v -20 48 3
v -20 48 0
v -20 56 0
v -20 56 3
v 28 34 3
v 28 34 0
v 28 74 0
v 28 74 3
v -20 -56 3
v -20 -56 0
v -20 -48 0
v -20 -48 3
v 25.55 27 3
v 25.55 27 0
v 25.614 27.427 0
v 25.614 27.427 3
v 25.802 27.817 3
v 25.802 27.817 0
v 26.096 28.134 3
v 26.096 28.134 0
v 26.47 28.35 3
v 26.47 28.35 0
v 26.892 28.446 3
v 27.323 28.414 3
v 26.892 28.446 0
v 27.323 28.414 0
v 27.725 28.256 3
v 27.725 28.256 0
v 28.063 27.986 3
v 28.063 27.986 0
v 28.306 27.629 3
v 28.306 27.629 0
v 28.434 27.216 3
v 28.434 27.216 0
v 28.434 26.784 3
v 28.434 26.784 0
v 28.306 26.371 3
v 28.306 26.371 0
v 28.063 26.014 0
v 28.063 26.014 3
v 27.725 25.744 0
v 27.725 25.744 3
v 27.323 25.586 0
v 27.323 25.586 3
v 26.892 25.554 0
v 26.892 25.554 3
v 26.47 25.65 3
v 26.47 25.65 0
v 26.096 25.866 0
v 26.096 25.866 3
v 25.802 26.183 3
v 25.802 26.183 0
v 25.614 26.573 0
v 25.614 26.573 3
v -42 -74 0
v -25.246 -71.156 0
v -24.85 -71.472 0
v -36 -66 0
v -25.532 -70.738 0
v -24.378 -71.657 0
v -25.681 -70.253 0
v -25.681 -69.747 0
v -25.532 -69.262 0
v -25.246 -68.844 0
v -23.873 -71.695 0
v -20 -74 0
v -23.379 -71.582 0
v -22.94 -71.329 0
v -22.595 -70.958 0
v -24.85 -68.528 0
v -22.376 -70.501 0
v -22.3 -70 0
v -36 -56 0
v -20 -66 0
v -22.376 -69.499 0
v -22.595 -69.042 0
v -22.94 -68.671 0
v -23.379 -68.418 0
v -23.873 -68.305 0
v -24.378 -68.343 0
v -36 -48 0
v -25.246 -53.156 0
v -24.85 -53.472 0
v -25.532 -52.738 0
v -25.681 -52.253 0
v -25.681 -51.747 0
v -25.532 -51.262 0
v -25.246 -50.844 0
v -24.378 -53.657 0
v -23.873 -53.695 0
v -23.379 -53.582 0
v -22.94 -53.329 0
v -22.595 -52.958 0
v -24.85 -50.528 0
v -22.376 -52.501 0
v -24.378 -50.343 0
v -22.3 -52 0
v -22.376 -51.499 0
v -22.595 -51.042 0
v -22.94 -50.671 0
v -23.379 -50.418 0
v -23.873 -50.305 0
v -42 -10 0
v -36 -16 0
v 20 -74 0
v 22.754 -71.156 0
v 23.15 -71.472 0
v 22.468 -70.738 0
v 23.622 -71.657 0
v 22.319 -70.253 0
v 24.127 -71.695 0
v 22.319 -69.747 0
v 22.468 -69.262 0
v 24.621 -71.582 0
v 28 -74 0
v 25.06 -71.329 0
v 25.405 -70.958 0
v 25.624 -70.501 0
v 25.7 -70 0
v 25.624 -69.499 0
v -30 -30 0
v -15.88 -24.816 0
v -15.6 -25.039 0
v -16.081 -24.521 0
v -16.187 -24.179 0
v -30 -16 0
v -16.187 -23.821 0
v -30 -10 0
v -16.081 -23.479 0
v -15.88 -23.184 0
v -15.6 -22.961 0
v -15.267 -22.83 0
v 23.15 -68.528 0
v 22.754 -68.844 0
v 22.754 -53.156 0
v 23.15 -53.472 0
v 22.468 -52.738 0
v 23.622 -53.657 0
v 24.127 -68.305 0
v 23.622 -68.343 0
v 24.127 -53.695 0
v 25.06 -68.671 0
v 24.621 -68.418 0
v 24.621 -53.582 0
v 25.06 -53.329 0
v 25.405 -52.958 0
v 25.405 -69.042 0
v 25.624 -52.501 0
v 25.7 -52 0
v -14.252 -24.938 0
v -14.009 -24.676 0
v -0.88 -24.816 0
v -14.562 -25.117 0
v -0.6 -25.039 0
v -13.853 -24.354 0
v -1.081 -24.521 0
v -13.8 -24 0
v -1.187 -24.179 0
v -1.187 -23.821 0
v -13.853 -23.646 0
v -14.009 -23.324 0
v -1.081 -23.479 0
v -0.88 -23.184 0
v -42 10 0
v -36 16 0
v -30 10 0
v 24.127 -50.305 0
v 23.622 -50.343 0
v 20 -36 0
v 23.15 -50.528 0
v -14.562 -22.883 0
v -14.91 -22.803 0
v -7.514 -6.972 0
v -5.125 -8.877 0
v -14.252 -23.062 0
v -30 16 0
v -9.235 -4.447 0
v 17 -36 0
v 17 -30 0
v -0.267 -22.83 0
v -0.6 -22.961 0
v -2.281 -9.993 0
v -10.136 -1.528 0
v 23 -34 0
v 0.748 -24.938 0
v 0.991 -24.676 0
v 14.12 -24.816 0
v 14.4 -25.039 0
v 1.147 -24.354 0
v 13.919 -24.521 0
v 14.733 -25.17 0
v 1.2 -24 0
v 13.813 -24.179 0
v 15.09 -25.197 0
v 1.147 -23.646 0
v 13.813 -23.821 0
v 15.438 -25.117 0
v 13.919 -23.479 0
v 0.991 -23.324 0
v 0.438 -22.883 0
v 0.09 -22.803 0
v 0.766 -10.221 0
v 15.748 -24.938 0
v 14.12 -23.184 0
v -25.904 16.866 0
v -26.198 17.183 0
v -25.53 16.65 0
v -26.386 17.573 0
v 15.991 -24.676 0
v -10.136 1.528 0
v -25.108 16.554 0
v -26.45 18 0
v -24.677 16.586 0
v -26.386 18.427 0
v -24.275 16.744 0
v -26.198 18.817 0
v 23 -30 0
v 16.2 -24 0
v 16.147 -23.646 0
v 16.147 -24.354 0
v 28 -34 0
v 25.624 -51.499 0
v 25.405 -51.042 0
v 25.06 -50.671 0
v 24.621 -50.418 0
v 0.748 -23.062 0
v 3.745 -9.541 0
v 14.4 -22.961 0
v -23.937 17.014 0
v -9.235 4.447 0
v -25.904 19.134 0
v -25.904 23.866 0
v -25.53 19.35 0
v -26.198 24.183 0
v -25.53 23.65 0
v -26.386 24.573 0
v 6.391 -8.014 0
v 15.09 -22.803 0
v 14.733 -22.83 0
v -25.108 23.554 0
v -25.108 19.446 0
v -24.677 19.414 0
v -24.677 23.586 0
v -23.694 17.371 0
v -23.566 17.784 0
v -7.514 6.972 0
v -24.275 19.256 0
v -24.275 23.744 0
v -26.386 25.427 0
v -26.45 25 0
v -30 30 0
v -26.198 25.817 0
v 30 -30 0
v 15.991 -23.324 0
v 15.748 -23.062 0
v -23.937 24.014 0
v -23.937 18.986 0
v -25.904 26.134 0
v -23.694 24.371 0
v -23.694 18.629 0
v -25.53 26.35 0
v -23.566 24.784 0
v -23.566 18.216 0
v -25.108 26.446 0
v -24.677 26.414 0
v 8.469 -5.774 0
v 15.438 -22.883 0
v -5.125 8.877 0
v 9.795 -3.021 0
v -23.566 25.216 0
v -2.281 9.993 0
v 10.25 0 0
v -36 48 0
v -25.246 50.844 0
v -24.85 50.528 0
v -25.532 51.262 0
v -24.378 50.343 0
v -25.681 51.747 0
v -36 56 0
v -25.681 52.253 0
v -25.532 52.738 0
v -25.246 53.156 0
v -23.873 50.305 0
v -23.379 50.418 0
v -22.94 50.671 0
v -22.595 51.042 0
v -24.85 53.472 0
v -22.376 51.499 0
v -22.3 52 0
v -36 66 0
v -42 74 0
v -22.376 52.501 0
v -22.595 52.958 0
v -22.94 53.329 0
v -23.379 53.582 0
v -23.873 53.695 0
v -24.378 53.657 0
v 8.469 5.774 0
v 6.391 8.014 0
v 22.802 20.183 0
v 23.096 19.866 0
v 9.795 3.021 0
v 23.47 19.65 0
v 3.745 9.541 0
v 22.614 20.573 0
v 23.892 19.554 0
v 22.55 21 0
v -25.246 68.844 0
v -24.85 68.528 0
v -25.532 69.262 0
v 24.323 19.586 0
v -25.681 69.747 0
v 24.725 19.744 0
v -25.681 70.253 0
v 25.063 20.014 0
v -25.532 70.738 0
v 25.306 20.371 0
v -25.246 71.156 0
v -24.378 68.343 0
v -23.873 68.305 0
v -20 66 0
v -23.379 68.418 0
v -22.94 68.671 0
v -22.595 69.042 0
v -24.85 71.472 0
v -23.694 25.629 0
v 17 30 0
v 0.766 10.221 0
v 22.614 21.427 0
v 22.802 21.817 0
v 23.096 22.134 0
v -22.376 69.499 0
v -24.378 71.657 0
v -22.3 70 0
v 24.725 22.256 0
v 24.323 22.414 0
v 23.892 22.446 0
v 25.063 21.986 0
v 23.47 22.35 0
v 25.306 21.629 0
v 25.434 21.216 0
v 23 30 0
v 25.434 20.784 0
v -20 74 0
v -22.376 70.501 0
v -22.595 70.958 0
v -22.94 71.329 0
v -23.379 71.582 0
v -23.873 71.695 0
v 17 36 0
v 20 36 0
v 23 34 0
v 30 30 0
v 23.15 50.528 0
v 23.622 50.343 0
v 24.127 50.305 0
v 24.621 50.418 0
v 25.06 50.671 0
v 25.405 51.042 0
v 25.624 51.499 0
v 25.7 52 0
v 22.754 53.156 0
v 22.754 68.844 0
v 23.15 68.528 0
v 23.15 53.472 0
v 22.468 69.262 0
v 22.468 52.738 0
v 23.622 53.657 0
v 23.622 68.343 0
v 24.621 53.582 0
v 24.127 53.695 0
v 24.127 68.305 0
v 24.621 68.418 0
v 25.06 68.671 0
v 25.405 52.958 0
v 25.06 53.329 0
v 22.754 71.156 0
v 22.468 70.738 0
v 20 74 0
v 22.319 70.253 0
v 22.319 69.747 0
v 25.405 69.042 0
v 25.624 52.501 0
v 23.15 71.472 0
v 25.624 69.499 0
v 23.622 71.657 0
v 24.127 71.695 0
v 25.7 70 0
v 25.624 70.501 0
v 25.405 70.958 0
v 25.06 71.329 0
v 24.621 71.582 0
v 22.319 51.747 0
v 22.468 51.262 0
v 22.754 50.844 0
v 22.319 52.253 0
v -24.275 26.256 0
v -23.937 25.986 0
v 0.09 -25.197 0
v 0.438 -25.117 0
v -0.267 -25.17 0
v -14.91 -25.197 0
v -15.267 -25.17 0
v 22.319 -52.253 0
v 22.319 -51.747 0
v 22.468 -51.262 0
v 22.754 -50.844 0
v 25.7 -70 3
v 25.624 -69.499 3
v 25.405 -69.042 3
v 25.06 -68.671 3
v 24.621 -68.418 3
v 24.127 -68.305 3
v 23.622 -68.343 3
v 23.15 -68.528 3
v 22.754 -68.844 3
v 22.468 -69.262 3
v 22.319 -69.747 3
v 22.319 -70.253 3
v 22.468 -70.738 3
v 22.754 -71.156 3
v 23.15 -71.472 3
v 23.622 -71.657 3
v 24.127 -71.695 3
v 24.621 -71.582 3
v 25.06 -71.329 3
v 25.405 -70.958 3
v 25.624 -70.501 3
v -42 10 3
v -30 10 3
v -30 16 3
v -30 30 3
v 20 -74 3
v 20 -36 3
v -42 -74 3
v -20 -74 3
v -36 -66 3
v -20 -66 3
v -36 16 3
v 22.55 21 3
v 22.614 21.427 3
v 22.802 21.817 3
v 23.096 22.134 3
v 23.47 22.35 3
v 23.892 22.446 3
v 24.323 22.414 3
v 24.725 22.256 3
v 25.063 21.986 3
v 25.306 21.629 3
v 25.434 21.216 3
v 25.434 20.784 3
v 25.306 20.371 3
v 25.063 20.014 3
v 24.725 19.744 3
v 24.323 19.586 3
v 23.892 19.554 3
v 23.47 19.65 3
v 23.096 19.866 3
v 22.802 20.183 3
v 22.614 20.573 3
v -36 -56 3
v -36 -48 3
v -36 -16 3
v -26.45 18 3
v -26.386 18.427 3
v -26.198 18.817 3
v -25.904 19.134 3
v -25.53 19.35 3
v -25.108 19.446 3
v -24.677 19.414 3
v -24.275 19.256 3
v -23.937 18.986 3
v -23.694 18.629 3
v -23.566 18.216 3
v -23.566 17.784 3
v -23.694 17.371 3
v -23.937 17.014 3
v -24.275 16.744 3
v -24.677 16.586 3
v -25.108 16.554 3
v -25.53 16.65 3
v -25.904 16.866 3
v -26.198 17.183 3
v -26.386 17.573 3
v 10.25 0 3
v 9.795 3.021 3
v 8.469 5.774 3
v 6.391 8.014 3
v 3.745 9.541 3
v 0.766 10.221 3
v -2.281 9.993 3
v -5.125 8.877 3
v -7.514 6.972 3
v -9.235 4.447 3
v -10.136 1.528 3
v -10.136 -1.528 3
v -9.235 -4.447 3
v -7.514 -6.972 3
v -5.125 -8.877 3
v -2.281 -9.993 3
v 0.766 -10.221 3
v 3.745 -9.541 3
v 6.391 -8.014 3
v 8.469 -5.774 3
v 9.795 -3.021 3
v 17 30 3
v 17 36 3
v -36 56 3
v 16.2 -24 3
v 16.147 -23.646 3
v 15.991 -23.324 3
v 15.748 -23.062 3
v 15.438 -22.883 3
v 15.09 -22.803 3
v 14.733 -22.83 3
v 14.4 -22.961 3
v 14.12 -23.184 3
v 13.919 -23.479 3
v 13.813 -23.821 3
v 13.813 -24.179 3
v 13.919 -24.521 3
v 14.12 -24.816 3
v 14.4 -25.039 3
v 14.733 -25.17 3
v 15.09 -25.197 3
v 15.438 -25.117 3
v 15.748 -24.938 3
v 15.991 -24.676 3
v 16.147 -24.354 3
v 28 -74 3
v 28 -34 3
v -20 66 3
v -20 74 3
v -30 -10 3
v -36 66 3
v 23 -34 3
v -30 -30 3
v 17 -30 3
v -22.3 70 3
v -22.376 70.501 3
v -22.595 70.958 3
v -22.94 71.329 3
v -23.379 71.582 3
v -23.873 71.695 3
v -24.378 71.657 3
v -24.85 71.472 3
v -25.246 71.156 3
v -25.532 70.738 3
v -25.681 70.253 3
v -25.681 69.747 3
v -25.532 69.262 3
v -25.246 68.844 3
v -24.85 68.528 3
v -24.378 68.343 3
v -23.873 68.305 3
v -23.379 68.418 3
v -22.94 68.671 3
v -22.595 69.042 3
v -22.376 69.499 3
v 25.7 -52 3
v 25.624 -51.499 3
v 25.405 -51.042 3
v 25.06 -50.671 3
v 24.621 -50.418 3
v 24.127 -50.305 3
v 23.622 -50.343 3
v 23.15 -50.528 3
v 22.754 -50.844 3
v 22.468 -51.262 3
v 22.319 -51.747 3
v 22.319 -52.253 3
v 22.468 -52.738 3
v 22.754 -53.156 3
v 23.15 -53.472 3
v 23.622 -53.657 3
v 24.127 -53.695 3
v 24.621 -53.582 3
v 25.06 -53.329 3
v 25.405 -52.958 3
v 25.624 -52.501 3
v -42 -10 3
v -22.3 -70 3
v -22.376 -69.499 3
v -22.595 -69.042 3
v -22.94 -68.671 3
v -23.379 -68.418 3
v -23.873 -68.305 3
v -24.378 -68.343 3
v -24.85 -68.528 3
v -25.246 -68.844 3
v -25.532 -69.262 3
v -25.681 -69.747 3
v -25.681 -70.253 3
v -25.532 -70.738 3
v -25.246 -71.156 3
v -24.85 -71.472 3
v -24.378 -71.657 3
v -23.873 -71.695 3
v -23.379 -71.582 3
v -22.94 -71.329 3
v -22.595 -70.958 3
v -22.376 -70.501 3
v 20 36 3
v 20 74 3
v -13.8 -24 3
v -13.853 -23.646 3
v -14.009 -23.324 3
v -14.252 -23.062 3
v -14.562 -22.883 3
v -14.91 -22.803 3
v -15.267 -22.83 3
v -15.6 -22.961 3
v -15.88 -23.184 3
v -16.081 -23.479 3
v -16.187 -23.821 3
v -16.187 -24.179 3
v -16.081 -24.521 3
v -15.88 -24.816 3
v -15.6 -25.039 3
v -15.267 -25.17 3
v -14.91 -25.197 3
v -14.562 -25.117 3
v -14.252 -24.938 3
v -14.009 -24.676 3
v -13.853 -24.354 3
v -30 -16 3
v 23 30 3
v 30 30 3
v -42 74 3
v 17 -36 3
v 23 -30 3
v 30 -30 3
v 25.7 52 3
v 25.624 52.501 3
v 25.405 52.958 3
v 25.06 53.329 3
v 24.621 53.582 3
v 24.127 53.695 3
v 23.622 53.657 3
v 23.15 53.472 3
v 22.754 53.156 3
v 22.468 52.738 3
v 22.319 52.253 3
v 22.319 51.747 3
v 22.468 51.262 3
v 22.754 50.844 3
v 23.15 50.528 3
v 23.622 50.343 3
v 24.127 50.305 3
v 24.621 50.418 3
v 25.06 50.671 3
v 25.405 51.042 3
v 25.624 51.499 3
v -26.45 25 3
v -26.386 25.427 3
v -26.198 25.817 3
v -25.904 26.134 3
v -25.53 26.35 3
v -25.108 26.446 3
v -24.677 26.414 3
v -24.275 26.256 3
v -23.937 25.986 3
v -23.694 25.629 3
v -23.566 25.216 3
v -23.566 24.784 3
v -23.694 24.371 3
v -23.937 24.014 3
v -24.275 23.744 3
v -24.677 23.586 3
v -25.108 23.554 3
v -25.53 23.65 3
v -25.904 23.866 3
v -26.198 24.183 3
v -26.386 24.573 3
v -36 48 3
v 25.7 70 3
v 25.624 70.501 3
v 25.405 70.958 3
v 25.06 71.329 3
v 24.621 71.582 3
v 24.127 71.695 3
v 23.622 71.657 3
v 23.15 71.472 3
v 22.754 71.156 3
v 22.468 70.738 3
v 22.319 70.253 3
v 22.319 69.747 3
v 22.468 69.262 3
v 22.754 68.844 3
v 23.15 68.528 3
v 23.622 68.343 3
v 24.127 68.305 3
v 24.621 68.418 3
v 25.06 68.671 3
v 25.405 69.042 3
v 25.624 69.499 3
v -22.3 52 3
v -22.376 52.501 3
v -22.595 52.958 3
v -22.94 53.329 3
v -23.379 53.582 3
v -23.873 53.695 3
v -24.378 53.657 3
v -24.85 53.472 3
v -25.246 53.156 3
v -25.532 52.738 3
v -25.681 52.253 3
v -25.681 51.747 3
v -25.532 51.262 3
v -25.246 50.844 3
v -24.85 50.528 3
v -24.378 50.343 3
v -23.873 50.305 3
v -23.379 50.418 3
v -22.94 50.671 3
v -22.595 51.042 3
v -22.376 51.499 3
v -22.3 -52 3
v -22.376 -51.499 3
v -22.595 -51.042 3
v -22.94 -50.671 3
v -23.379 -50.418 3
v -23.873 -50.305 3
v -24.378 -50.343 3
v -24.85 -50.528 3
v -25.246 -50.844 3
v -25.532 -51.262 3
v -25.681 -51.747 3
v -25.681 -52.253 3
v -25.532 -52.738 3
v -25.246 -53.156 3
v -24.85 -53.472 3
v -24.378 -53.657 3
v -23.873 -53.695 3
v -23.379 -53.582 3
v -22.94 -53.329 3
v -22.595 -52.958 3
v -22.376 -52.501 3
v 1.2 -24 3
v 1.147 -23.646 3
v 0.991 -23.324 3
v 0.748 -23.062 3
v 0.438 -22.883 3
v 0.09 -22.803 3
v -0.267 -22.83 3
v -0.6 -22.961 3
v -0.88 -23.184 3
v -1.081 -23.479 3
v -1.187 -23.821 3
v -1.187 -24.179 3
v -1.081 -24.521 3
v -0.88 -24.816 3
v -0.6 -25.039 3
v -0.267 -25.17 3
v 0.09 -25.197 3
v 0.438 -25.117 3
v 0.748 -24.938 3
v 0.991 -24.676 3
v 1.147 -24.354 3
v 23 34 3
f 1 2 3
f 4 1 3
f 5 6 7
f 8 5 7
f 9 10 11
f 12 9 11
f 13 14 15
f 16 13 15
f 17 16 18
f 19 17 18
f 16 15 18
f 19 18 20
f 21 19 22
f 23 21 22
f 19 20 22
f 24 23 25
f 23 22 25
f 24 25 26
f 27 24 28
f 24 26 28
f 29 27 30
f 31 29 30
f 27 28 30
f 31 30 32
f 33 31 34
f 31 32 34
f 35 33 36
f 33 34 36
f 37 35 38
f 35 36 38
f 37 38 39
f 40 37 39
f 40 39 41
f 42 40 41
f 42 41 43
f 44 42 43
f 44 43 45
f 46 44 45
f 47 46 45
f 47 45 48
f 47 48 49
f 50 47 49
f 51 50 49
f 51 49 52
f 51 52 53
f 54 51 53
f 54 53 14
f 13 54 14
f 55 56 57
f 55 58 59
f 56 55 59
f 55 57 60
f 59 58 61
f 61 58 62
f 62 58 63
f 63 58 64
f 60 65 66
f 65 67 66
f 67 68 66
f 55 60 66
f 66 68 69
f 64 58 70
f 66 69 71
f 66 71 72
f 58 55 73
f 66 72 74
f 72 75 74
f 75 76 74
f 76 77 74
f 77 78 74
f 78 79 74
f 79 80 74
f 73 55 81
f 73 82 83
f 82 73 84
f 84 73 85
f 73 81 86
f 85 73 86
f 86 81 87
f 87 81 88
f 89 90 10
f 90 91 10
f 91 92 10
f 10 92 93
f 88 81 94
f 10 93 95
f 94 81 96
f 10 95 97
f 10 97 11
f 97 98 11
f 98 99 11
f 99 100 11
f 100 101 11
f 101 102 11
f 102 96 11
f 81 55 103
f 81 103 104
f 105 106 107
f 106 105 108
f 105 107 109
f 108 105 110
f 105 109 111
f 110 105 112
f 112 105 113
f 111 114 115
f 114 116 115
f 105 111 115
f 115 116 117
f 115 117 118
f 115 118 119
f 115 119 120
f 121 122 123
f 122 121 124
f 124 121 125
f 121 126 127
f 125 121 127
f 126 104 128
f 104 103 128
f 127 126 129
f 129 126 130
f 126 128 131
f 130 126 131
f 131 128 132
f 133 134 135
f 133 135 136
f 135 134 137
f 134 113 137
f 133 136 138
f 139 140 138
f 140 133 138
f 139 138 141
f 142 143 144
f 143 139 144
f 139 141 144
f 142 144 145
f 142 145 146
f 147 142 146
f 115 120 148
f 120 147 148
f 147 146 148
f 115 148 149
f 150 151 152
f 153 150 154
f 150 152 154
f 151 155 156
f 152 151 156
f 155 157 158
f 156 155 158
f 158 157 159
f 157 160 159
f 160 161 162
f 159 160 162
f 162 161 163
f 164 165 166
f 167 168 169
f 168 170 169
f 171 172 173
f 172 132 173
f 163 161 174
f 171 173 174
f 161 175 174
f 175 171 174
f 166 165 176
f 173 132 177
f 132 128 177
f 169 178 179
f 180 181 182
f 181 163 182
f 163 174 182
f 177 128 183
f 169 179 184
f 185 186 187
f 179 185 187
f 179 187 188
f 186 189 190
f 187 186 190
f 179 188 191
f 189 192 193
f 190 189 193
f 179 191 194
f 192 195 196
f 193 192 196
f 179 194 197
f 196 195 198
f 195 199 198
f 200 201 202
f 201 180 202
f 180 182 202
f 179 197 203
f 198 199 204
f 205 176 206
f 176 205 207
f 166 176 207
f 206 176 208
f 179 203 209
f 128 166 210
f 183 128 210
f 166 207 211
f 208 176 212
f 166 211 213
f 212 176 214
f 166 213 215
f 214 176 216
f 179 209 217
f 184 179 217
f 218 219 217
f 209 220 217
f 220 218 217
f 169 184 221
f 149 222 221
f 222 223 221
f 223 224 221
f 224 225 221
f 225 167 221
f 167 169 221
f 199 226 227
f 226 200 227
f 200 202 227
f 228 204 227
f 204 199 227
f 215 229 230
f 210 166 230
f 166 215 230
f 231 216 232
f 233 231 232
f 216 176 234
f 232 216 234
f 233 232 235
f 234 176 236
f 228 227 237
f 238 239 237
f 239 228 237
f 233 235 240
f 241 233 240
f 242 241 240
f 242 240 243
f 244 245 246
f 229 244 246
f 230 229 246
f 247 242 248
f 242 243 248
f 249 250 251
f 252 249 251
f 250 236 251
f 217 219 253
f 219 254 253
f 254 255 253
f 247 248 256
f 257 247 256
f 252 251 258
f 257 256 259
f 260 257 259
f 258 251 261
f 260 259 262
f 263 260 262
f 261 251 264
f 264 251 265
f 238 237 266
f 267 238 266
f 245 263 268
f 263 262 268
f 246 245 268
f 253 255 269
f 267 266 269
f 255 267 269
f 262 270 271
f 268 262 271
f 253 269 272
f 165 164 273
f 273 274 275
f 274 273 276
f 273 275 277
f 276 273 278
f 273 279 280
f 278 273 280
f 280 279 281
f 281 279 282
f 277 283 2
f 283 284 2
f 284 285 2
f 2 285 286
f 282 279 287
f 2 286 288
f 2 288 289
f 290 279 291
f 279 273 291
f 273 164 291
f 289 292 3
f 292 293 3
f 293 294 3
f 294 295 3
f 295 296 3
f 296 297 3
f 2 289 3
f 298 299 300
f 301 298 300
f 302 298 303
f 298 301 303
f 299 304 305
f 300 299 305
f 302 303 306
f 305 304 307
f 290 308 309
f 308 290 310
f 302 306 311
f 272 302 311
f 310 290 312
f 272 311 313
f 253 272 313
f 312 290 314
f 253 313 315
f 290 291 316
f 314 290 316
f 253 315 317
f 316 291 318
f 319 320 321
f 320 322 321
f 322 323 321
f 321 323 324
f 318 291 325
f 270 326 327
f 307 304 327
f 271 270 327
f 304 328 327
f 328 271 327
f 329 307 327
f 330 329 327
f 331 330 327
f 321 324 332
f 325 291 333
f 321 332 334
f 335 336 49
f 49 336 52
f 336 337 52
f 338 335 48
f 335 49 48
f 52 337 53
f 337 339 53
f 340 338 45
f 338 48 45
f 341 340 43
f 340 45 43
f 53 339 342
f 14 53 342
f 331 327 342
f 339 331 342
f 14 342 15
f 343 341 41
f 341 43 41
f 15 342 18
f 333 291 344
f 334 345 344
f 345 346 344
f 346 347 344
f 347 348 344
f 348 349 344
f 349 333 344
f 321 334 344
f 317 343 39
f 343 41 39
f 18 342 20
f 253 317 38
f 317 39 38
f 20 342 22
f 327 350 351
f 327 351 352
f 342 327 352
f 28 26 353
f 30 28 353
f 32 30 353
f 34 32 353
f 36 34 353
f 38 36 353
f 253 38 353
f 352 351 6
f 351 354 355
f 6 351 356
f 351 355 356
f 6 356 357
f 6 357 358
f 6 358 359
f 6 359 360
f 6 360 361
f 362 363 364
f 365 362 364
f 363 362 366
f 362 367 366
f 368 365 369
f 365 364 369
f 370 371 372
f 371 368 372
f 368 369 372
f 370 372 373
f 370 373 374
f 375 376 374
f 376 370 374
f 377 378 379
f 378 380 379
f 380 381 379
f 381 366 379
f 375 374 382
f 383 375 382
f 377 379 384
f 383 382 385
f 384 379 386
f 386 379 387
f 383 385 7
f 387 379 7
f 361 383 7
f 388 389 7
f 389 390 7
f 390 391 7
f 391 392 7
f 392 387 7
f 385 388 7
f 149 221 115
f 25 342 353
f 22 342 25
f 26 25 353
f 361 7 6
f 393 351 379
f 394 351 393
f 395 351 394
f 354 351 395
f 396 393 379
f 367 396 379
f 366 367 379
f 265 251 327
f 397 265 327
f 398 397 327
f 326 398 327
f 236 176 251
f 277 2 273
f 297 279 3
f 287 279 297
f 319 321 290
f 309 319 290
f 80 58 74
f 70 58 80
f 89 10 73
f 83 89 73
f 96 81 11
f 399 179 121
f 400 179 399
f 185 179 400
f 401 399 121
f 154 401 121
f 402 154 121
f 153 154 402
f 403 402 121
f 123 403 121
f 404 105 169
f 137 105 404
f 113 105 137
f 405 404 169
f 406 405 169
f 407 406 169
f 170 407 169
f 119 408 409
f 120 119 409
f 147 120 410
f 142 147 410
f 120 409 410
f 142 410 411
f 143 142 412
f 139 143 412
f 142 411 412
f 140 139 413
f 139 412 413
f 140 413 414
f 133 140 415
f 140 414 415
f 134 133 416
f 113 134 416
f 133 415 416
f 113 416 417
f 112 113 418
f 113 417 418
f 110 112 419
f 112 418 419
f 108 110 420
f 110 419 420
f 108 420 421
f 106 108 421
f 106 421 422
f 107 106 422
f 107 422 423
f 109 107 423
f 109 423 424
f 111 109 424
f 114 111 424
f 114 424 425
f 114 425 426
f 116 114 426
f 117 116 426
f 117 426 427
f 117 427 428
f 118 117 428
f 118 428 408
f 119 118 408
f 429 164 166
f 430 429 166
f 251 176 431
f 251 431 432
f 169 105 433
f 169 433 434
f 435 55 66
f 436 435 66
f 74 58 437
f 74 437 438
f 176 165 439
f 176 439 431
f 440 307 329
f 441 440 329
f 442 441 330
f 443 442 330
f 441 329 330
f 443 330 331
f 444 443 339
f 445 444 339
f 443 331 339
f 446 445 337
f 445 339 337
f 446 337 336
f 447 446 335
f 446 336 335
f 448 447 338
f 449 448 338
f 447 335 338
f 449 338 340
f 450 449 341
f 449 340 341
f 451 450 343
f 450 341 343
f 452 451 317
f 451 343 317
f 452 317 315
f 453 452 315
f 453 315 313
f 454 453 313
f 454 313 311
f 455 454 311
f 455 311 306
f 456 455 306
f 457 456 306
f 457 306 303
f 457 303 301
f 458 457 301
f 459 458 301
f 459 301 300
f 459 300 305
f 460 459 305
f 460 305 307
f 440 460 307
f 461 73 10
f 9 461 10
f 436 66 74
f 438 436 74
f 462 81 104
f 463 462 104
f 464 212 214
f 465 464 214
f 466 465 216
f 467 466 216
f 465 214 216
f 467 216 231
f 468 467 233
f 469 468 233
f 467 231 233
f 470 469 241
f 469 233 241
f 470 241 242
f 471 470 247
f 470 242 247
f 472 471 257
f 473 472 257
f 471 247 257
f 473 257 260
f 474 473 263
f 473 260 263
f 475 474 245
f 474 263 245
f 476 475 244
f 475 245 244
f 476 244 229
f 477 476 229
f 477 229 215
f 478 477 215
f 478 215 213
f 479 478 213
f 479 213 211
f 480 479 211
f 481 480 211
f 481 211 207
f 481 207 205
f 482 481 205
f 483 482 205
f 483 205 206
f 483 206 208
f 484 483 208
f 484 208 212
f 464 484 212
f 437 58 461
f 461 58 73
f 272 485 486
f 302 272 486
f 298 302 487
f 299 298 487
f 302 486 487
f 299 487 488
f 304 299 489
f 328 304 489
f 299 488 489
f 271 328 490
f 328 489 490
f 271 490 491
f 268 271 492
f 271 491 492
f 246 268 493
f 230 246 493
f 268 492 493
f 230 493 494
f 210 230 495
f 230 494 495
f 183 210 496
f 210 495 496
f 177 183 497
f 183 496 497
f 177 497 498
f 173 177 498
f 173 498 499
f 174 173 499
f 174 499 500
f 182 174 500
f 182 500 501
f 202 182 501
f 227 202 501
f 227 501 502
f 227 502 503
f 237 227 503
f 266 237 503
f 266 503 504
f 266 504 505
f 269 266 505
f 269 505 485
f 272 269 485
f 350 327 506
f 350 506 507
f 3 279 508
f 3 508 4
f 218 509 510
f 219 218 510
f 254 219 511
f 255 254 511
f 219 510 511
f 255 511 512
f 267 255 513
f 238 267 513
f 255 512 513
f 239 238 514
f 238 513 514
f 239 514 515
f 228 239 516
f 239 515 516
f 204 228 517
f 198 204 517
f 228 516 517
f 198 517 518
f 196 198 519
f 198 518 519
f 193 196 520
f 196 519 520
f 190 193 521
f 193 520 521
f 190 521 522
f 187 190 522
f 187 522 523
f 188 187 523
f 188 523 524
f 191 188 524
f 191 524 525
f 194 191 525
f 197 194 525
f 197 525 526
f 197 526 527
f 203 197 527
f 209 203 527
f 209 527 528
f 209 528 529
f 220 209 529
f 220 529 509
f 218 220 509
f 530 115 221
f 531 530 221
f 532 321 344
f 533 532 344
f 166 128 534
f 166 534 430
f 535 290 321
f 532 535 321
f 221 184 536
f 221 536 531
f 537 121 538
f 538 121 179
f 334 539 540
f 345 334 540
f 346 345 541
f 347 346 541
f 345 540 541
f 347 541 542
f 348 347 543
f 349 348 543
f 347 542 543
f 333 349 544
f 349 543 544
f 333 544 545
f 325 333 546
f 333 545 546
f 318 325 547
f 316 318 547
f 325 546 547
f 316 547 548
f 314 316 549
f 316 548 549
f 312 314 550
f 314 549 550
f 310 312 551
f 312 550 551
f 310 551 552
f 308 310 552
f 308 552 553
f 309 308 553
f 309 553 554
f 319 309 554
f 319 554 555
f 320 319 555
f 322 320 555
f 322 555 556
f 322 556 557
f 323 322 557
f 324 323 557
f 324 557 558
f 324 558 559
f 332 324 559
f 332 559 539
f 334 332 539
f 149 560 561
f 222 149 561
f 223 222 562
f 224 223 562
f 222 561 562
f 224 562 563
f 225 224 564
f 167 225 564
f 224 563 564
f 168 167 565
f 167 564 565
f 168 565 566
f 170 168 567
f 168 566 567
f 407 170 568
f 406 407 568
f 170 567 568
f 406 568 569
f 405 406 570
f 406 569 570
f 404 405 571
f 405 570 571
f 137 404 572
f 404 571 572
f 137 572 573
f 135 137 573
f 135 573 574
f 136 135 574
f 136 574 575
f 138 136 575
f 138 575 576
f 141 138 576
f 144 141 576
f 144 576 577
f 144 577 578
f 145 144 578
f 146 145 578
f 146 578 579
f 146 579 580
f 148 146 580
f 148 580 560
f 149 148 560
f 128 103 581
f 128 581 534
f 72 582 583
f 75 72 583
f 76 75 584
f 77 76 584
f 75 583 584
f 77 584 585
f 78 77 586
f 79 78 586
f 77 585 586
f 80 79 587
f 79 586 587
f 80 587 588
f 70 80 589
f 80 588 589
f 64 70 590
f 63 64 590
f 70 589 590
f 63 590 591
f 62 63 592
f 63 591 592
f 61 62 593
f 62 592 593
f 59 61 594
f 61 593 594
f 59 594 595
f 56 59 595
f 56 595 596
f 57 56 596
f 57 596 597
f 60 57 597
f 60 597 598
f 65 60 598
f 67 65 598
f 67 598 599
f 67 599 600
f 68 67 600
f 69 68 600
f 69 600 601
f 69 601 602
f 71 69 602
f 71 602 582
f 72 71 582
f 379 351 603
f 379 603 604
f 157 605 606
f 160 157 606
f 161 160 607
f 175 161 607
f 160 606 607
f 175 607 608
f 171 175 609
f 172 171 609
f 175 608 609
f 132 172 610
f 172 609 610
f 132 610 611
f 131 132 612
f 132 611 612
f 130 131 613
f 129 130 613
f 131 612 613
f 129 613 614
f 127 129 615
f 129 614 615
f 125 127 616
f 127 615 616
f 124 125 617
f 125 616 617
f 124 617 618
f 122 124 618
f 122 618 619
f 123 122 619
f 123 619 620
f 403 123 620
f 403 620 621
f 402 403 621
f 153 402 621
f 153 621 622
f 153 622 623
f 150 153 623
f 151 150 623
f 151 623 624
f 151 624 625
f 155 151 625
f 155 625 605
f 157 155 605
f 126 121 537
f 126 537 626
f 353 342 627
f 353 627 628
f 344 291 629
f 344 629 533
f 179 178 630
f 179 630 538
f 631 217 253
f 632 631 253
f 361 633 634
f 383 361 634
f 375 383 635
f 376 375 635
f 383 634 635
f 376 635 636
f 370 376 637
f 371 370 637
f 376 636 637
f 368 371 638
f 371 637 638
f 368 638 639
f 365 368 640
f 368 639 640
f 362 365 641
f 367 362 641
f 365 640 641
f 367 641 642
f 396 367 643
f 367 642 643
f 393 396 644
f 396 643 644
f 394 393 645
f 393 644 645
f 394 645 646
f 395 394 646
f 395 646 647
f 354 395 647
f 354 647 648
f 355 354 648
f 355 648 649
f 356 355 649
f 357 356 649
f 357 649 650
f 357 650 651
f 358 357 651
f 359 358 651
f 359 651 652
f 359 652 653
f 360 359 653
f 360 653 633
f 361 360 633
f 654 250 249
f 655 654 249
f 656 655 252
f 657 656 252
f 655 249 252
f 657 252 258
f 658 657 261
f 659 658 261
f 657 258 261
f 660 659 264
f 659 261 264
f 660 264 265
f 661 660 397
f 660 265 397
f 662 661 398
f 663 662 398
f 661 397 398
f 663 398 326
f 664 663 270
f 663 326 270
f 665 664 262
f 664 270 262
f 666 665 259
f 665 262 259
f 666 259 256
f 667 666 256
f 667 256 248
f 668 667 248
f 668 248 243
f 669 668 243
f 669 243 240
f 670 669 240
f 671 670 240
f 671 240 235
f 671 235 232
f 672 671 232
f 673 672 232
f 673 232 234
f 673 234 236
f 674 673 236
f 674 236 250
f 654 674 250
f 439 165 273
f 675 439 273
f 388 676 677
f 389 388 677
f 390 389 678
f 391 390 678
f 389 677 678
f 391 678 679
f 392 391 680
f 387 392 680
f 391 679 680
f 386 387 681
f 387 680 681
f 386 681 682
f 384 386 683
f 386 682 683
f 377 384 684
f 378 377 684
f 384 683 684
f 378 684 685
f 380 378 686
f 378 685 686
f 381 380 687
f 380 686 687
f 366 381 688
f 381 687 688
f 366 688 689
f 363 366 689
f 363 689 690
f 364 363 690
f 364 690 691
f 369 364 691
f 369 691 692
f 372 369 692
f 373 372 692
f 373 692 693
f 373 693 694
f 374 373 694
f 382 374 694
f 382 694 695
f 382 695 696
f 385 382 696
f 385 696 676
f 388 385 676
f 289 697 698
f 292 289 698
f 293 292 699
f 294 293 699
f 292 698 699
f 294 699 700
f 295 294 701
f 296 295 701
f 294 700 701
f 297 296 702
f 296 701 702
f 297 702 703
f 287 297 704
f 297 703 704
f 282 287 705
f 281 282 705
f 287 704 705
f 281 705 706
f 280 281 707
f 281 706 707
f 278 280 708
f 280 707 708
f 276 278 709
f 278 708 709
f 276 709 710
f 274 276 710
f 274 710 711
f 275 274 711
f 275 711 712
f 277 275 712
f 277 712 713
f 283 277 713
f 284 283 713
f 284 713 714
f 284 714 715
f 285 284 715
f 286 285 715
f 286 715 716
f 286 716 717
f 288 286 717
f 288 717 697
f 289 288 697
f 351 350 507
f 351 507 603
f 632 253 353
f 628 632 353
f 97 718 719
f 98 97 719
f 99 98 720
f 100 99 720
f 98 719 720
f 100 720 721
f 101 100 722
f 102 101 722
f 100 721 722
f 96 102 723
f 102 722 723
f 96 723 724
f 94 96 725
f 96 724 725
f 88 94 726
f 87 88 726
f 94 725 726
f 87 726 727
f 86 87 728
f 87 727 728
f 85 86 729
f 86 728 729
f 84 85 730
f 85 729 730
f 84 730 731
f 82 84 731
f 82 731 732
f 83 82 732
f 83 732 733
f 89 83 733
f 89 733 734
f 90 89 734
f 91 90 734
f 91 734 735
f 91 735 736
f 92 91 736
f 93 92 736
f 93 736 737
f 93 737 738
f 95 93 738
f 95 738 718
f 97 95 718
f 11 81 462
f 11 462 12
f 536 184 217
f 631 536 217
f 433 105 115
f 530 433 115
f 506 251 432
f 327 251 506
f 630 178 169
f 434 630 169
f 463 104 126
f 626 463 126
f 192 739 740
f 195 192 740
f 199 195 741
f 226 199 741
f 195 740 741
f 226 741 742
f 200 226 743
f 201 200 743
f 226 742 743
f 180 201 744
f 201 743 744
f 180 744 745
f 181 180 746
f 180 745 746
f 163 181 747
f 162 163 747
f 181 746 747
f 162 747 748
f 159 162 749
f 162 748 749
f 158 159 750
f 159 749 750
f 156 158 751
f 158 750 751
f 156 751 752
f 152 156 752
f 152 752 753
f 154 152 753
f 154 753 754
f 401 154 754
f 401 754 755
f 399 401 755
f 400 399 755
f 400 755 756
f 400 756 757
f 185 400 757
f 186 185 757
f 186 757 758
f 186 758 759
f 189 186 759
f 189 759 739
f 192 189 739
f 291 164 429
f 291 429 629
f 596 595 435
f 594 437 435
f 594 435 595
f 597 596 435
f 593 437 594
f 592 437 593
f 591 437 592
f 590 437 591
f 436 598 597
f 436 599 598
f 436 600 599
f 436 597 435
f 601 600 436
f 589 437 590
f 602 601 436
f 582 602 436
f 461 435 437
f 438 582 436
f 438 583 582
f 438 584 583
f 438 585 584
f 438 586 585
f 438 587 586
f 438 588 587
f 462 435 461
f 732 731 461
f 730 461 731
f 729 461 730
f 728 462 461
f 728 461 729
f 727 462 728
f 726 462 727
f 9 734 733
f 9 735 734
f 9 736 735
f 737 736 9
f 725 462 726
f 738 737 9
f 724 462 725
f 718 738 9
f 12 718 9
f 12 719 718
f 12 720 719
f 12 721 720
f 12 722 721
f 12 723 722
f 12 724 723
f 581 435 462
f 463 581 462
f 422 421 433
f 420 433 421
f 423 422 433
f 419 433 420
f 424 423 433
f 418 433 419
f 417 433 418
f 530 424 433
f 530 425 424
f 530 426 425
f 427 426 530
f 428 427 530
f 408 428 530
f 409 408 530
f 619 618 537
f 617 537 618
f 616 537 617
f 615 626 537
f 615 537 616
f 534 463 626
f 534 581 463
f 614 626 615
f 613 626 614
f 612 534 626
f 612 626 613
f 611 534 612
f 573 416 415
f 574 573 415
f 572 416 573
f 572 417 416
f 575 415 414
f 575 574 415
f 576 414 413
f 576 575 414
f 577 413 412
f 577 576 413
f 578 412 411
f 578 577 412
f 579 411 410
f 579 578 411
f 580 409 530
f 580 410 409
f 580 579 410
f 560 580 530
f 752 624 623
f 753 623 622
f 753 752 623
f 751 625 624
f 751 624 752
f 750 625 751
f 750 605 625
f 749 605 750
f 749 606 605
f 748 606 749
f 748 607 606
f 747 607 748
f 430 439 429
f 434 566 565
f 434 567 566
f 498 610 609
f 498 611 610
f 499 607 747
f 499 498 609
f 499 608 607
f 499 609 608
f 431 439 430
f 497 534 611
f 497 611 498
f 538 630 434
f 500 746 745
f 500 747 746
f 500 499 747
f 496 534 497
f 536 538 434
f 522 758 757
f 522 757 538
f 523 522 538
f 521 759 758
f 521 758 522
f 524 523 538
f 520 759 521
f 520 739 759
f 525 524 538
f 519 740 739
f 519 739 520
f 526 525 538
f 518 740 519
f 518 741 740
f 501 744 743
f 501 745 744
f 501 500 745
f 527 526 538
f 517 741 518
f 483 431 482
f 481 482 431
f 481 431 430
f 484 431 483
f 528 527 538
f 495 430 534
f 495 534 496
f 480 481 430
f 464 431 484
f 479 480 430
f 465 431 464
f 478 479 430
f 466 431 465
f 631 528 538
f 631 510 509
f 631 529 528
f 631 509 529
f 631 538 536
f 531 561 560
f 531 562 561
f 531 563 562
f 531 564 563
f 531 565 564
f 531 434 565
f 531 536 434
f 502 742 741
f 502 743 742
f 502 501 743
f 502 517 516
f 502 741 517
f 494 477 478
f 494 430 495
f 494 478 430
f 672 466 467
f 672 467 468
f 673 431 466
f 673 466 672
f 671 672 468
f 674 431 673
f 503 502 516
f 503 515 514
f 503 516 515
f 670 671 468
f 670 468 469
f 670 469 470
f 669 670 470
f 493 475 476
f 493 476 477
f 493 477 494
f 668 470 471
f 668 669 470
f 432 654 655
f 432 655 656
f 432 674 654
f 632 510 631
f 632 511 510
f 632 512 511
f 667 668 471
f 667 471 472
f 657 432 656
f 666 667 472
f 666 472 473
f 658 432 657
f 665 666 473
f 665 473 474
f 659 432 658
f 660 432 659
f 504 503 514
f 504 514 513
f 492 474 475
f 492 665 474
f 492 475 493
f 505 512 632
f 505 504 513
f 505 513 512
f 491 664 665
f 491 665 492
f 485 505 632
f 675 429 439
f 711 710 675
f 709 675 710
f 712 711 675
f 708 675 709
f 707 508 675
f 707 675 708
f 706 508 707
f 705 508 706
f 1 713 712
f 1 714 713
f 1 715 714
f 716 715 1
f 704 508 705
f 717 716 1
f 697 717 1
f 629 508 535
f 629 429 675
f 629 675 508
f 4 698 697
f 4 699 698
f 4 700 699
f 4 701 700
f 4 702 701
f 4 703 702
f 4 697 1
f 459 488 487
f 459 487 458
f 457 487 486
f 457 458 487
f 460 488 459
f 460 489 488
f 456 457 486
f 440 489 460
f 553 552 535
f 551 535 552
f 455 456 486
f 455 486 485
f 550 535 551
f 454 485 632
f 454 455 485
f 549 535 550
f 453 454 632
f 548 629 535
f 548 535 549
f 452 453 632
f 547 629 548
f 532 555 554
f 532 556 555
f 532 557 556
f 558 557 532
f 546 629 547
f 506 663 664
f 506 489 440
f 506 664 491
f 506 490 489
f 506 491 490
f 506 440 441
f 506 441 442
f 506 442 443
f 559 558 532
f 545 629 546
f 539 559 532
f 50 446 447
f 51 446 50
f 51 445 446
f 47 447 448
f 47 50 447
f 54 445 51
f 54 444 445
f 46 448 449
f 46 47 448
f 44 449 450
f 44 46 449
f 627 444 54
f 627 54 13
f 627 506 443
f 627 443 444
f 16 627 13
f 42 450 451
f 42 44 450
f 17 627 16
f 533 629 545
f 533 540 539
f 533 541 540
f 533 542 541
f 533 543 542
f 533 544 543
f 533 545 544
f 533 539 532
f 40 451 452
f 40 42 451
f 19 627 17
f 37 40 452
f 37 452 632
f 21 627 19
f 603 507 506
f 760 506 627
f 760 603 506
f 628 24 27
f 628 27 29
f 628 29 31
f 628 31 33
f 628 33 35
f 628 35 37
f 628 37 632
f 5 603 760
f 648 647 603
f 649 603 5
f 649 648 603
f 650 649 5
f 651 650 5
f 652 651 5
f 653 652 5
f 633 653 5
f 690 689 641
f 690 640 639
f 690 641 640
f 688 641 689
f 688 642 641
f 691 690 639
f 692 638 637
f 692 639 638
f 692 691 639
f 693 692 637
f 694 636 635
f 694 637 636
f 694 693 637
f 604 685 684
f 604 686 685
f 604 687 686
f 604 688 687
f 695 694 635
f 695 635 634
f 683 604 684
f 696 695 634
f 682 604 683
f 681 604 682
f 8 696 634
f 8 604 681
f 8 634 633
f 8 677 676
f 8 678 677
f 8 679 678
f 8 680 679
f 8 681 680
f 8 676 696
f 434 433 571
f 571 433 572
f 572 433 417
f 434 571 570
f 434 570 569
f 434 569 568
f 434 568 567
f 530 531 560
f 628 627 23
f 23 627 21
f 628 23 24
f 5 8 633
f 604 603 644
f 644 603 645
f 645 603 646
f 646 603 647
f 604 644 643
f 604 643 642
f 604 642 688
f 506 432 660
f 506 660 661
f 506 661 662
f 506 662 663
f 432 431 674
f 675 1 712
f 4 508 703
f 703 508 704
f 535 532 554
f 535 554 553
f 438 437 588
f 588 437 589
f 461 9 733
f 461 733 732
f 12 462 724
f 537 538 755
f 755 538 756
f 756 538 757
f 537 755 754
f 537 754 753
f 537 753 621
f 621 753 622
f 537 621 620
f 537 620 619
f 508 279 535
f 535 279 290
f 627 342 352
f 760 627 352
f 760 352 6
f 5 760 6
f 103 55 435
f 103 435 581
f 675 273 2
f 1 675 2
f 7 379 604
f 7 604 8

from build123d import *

# Parameters (mm, degrees)
SKETCH1_W                                 = 60
SKETCH1_H                                 = 60
BOSS_EXTRUDE1_DEPTH                       = 3
SKETCH2_R                                 = 10.25
CUT_EXTRUDE1_DEPTH                        = 43.532340636
SKETCH4_R                                 = 1.45
STOP_MOUNT_D2P9_THROUGH_DEPTH             = 3.01
SKETCH5_R                                 = 1.45
SERVO_X_MOUNT_D2P9_DEPTH                  = 3.01
SKETCH6_R                                 = 1.2
GUIDERAIL2_D2P4_DEPTH                     = 3.01
SKETCH12_W                                = 15
SKETCH12_H                                = 6
ROUTED_FRAME_EAR_LEFTPLUS_ROOT_DEPTH      = 3
SKETCH13_W                                = 6
SKETCH13_H                                = 46
ROUTED_FRAME_EAR_LEFTPLUS_OUTBOARD_DEPTH  = 3
SKETCH14_W                                = 22
SKETCH14_H                                = 8
ROUTED_FRAME_EAR_LEFTPLUS_PAD_DEPTH       = 3
SKETCH15_W                                = 15
SKETCH15_H                                = 6
ROUTED_FRAME_EAR_LEFTMINUS_ROOT_DEPTH     = 3
SKETCH16_W                                = 6
SKETCH16_H                                = 46
ROUTED_FRAME_EAR_LEFTMINUS_OUTBOARD_DEPTH = 3
SKETCH17_W                                = 22
SKETCH17_H                                = 8
ROUTED_FRAME_EAR_LEFTMINUS_PAD_DEPTH      = 3
SKETCH18_W                                = 6
SKETCH18_H                                = 8
ROUTED_FRAME_EAR_RIGHTPLUS_ROOT_DEPTH     = 3
SKETCH19_W                                = 8
SKETCH19_H                                = 22
ROUTED_FRAME_EAR_RIGHTPLUS_PAD_DEPTH      = 3
SKETCH20_W                                = 6
SKETCH20_H                                = 8
ROUTED_FRAME_EAR_RIGHTMINUS_ROOT_DEPTH    = 3
SKETCH21_W                                = 8
SKETCH21_H                                = 22
ROUTED_FRAME_EAR_RIGHTMINUS_PAD_DEPTH     = 3
SKETCH22_R                                = 1.7
ROUTED_FRAME_EARS_D3P4_DEPTH              = 3.01
SKETCH23_W                                = 6
SKETCH23_H                                = 20
FOUR_LINK_SUPPORT_PLUS_LEFTRAIL_DEPTH     = 3
SKETCH24_W                                = 22
SKETCH24_H                                = 8
FOUR_LINK_SUPPORT_PLUS_LEFTPAD_DEPTH      = 3
SKETCH25_W                                = 8
SKETCH25_H                                = 20
FOUR_LINK_SUPPORT_PLUS_RIGHTRAIL_DEPTH    = 3
SKETCH26_W                                = 6
SKETCH26_H                                = 20
FOUR_LINK_SUPPORT_MINUS_LEFTRAIL_DEPTH    = 3
SKETCH27_W                                = 22
SKETCH27_H                                = 8
FOUR_LINK_SUPPORT_MINUS_LEFTPAD_DEPTH     = 3
SKETCH28_W                                = 8
SKETCH28_H                                = 20
FOUR_LINK_SUPPORT_MINUS_RIGHTRAIL_DEPTH   = 3
SKETCH29_R                                = 1.7
FOUR_LINK_SUPPORT_HOLES_Y70_DEPTH         = 3.01


with BuildPart() as part:
    # Sketch1 → Boss-Extrude1 (new body)
    with BuildSketch(Plane.XY):
        Rectangle(SKETCH1_W, SKETCH1_H)
    extrude(amount=BOSS_EXTRUDE1_DEPTH)

    # Sketch2 → Cut-Extrude1 (cut, through all)
    with BuildSketch(Plane.XY.offset(3)):
        Circle(SKETCH2_R)
    extrude(amount=-CUT_EXTRUDE1_DEPTH, mode=Mode.SUBTRACT)

    # Sketch4 → Stop_Mount_D2p9_Through (cut)
    with BuildSketch(Plane(origin=(0, 0, 0), x_dir=(-1, 0, 0), z_dir=(0, 0, -1))):
        with Locations((-24, 21)):
            Circle(SKETCH4_R)
        with Locations((-27, 27)):
            Circle(SKETCH4_R)
    extrude(amount=-STOP_MOUNT_D2P9_THROUGH_DEPTH, mode=Mode.SUBTRACT)

    # Sketch5 → Servo_X_Mount_D2p9 (cut)
    with BuildSketch(Plane(origin=(0, 0, 0), x_dir=(-1, 0, 0), z_dir=(0, 0, -1))):
        with Locations((25, 18)):
            Circle(SKETCH5_R)
        with Locations((25, 25)):
            Circle(SKETCH5_R)
    extrude(amount=-SERVO_X_MOUNT_D2P9_DEPTH, mode=Mode.SUBTRACT)

    # Sketch6 → GuideRail2_D2p4 (cut)
    with BuildSketch(Plane.XY.offset(3)):
        with Locations((15, -24)):
            Circle(SKETCH6_R)
        with Locations((0, -24)):
            Circle(SKETCH6_R)
        with Locations((-15, -24)):
            Circle(SKETCH6_R)
    extrude(amount=-GUIDERAIL2_D2P4_DEPTH, mode=Mode.SUBTRACT)

    # Sketch12 → Routed_Frame_Ear_LeftPlus_Root (add)
    with BuildSketch(Plane.XY):
        with Locations((-34.5, 13)):
            Rectangle(SKETCH12_W, SKETCH12_H)
    extrude(amount=ROUTED_FRAME_EAR_LEFTPLUS_ROOT_DEPTH)

    # Sketch13 → Routed_Frame_Ear_LeftPlus_Outboard (add)
    with BuildSketch(Plane.XY):
        with Locations((-39, 33)):
            Rectangle(SKETCH13_W, SKETCH13_H)
    extrude(amount=ROUTED_FRAME_EAR_LEFTPLUS_OUTBOARD_DEPTH)

    # Sketch14 → Routed_Frame_Ear_LeftPlus_Pad (add)
    with BuildSketch(Plane.XY):
        with Locations((-31, 52)):
            Rectangle(SKETCH14_W, SKETCH14_H)
    extrude(amount=ROUTED_FRAME_EAR_LEFTPLUS_PAD_DEPTH)

    # Sketch15 → Routed_Frame_Ear_LeftMinus_Root (add)
    with BuildSketch(Plane.XY):
        with Locations((-34.5, -13)):
            Rectangle(SKETCH15_W, SKETCH15_H)
    extrude(amount=ROUTED_FRAME_EAR_LEFTMINUS_ROOT_DEPTH)

    # Sketch16 → Routed_Frame_Ear_LeftMinus_Outboard (add)
    with BuildSketch(Plane.XY):
        with Locations((-39, -33)):
            Rectangle(SKETCH16_W, SKETCH16_H)
    extrude(amount=ROUTED_FRAME_EAR_LEFTMINUS_OUTBOARD_DEPTH)

    # Sketch17 → Routed_Frame_Ear_LeftMinus_Pad (add)
    with BuildSketch(Plane.XY):
        with Locations((-31, -52)):
            Rectangle(SKETCH17_W, SKETCH17_H)
    extrude(amount=ROUTED_FRAME_EAR_LEFTMINUS_PAD_DEPTH)

    # Sketch18 → Routed_Frame_Ear_RightPlus_Root (add)
    with BuildSketch(Plane.XY):
        with Locations((20, 32)):
            Rectangle(SKETCH18_W, SKETCH18_H)
    extrude(amount=ROUTED_FRAME_EAR_RIGHTPLUS_ROOT_DEPTH)

    # Sketch19 → Routed_Frame_Ear_RightPlus_Pad (add)
    with BuildSketch(Plane.XY):
        with Locations((24, 45)):
            Rectangle(SKETCH19_W, SKETCH19_H)
    extrude(amount=ROUTED_FRAME_EAR_RIGHTPLUS_PAD_DEPTH)

    # Sketch20 → Routed_Frame_Ear_RightMinus_Root (add)
    with BuildSketch(Plane.XY):
        with Locations((20, -32)):
            Rectangle(SKETCH20_W, SKETCH20_H)
    extrude(amount=ROUTED_FRAME_EAR_RIGHTMINUS_ROOT_DEPTH)

    # Sketch21 → Routed_Frame_Ear_RightMinus_Pad (add)
    with BuildSketch(Plane.XY):
        with Locations((24, -45)):
            Rectangle(SKETCH21_W, SKETCH21_H)
    extrude(amount=ROUTED_FRAME_EAR_RIGHTMINUS_PAD_DEPTH)

    # Sketch22 → Routed_Frame_Ears_D3p4 (cut)
    with BuildSketch(Plane.XY.offset(3)):
        with Locations((-24, -52)):
            Circle(SKETCH22_R)
        with Locations((-24, 52)):
            Circle(SKETCH22_R)
        with Locations((24, -52)):
            Circle(SKETCH22_R)
        with Locations((24, 52)):
            Circle(SKETCH22_R)
    extrude(amount=-ROUTED_FRAME_EARS_D3P4_DEPTH, mode=Mode.SUBTRACT)

    # Sketch23 → Four_Link_Support_Plus_LeftRail (add)
    with BuildSketch(Plane.XY):
        with Locations((-39, 64)):
            Rectangle(SKETCH23_W, SKETCH23_H)
    extrude(amount=FOUR_LINK_SUPPORT_PLUS_LEFTRAIL_DEPTH)

    # Sketch24 → Four_Link_Support_Plus_LeftPad (add)
    with BuildSketch(Plane.XY):
        with Locations((-31, 70)):
            Rectangle(SKETCH24_W, SKETCH24_H)
    extrude(amount=FOUR_LINK_SUPPORT_PLUS_LEFTPAD_DEPTH)

    # Sketch25 → Four_Link_Support_Plus_RightRail (add)
    with BuildSketch(Plane.XY):
        with Locations((24, 64)):
            Rectangle(SKETCH25_W, SKETCH25_H)
    extrude(amount=FOUR_LINK_SUPPORT_PLUS_RIGHTRAIL_DEPTH)

    # Sketch26 → Four_Link_Support_Minus_LeftRail (add)
    with BuildSketch(Plane.XY):
        with Locations((-39, -64)):
            Rectangle(SKETCH26_W, SKETCH26_H)
    extrude(amount=FOUR_LINK_SUPPORT_MINUS_LEFTRAIL_DEPTH)

    # Sketch27 → Four_Link_Support_Minus_LeftPad (add)
    with BuildSketch(Plane.XY):
        with Locations((-31, -70)):
            Rectangle(SKETCH27_W, SKETCH27_H)
    extrude(amount=FOUR_LINK_SUPPORT_MINUS_LEFTPAD_DEPTH)

    # Sketch28 → Four_Link_Support_Minus_RightRail (add)
    with BuildSketch(Plane.XY):
        with Locations((24, -64)):
            Rectangle(SKETCH28_W, SKETCH28_H)
    extrude(amount=FOUR_LINK_SUPPORT_MINUS_RIGHTRAIL_DEPTH)

    # Sketch29 → Four_Link_Support_Holes_Y70 (cut)
    with BuildSketch(Plane.XY.offset(3)):
        with Locations((-24, -70)):
            Circle(SKETCH29_R)
        with Locations((-24, 70)):
            Circle(SKETCH29_R)
        with Locations((24, -70)):
            Circle(SKETCH29_R)
        with Locations((24, 70)):
            Circle(SKETCH29_R)
    extrude(amount=-FOUR_LINK_SUPPORT_HOLES_Y70_DEPTH, mode=Mode.SUBTRACT)


solid = part.part
